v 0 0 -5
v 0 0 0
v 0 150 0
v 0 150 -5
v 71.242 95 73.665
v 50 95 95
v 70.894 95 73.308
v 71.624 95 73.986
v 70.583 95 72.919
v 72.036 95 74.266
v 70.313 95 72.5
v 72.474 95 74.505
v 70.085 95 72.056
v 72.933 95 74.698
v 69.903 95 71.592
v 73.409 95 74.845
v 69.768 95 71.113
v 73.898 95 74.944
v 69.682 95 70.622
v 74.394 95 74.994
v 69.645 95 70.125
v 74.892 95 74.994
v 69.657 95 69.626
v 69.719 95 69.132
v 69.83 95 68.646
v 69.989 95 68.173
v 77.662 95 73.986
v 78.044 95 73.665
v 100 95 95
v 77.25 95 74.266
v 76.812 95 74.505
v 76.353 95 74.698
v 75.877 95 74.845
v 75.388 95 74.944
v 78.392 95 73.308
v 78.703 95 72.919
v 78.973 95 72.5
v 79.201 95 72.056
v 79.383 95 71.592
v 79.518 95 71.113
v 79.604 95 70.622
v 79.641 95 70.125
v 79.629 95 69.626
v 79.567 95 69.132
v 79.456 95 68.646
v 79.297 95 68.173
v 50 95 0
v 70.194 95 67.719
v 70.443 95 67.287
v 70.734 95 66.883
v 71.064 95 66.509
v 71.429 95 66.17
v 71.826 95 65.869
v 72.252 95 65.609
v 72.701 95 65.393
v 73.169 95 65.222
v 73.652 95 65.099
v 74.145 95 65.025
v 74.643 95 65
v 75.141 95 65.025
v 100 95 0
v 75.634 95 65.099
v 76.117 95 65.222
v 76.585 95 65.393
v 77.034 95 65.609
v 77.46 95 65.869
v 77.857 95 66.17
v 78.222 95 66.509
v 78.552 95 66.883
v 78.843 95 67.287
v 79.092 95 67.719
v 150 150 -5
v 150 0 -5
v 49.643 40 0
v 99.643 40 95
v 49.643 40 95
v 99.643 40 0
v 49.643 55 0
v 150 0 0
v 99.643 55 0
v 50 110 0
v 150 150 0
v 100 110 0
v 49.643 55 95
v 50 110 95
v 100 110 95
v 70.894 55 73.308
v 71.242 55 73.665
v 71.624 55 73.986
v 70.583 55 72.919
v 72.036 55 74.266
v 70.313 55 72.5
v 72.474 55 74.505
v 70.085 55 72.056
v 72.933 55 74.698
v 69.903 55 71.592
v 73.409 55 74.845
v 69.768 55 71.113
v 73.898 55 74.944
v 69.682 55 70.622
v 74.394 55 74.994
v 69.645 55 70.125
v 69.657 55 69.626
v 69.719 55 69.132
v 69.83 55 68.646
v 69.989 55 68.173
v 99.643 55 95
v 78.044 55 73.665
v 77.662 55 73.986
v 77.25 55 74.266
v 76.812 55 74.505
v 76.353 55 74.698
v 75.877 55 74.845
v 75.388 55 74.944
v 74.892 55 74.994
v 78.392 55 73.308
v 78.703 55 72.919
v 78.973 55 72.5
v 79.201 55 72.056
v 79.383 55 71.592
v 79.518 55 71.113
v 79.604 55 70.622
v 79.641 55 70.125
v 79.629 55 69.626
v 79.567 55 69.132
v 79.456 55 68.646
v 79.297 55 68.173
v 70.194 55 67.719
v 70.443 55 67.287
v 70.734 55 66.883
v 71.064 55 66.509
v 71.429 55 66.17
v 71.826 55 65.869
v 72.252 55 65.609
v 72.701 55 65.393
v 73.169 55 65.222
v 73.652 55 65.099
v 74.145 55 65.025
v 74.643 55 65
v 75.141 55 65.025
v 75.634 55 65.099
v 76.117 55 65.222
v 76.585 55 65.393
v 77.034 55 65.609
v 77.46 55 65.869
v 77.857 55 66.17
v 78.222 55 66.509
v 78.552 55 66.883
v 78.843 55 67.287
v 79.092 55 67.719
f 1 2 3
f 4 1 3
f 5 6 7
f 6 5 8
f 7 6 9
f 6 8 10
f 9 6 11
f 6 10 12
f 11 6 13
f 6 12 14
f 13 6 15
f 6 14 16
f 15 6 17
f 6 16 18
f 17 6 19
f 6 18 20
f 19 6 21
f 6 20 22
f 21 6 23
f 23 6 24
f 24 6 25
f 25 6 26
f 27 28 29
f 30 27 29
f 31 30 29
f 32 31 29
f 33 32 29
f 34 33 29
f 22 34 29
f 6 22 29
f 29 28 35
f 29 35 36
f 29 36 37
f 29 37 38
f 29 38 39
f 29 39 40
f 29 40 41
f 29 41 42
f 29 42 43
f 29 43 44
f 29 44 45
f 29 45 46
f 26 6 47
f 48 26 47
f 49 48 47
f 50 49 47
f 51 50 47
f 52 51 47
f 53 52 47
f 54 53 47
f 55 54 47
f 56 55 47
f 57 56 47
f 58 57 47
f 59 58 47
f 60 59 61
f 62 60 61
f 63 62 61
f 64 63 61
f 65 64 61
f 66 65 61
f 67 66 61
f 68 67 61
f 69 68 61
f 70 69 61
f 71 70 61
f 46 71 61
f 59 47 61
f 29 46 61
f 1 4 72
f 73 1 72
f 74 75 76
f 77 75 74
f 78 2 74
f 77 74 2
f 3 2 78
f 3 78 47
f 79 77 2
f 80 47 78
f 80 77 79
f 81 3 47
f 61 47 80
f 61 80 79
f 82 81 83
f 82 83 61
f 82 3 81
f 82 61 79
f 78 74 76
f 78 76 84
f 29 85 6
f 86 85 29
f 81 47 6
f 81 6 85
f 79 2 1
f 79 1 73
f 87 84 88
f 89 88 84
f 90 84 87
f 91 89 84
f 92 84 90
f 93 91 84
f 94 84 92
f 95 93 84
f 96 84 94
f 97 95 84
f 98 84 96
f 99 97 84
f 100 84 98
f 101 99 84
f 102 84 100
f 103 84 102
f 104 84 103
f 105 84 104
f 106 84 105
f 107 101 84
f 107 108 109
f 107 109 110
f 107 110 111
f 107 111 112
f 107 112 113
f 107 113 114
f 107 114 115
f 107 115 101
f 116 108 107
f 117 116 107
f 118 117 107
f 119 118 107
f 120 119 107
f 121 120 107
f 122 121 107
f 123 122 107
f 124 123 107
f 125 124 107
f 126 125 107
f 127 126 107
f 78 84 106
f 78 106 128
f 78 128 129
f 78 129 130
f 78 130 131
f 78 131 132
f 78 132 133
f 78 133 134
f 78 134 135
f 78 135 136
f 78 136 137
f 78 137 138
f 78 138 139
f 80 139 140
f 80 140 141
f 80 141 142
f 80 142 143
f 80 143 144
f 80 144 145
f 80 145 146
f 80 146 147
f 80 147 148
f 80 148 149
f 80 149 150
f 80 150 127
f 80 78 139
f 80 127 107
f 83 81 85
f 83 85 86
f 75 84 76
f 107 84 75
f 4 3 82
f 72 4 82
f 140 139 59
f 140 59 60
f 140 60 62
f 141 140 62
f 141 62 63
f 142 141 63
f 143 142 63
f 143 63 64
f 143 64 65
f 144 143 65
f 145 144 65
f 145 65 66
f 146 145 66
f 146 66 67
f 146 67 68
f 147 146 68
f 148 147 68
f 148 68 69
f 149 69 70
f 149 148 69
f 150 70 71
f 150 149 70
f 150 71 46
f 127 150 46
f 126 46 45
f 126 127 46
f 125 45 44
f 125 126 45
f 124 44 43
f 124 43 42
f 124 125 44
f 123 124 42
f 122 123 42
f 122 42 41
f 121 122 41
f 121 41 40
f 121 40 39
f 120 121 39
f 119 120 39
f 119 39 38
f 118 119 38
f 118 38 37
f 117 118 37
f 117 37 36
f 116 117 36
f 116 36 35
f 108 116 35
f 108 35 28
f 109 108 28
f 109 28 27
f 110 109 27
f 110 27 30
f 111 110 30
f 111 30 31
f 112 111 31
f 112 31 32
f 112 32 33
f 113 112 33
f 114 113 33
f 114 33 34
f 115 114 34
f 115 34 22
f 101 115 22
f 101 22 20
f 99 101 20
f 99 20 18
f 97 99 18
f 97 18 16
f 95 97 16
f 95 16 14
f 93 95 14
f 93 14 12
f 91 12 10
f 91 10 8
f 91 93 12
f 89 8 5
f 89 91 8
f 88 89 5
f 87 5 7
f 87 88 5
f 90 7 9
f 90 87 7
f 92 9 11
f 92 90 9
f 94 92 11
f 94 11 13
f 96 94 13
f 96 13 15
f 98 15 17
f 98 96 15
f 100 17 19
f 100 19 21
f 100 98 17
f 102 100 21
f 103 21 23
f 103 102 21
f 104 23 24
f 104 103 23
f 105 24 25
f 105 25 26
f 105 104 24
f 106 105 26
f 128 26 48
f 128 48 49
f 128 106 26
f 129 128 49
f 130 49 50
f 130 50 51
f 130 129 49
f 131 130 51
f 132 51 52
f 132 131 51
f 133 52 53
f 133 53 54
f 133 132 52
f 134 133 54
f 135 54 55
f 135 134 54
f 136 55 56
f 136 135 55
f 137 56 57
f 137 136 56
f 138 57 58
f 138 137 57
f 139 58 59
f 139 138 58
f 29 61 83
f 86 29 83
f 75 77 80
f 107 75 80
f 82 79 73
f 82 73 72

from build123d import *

# Parameters (mm, degrees)
SCHIZZO2_W                   = 150
SCHIZZO2_H                   = 150
ESTRUSIONE_ESTRUSIONE1_DEPTH = 5
SCHIZZO3_W                   = 50
SCHIZZO3_H                   = 15
ESTRUSIONE_ESTRUSIONE2_DEPTH = 95
SCHIZZO6_R                   = 5
ESTRUSIONE_ESTRUSIONE3_DEPTH = 61.630141236


with BuildPart() as part:
    # Schizzo2 → Estrusione-Estrusione1 (new body)
    with BuildSketch(Plane.XY):
        with Locations((75, 75)):
            Rectangle(SCHIZZO2_W, SCHIZZO2_H)
    extrude(amount=-ESTRUSIONE_ESTRUSIONE1_DEPTH)

    # Schizzo3 → Estrusione-Estrusione2 (add)
    with BuildSketch(Plane.XY):
        with Locations((74.643012927, 47.5)):
            Rectangle(SCHIZZO3_W, SCHIZZO3_H)
        with Locations((75, 102.5)):
            Rectangle(SCHIZZO3_W, SCHIZZO3_H)
    extrude(amount=ESTRUSIONE_ESTRUSIONE2_DEPTH)

    # Schizzo6 → Estrusione-Estrusione3 (add)
    with BuildSketch(Plane.XZ.offset(-40)):
        with Locations(Location((74.643012927, 70, 0), (0, 0, 270))):
            Circle(SCHIZZO6_R)
    extrude(amount=-ESTRUSIONE_ESTRUSIONE3_DEPTH)


solid = part.part
